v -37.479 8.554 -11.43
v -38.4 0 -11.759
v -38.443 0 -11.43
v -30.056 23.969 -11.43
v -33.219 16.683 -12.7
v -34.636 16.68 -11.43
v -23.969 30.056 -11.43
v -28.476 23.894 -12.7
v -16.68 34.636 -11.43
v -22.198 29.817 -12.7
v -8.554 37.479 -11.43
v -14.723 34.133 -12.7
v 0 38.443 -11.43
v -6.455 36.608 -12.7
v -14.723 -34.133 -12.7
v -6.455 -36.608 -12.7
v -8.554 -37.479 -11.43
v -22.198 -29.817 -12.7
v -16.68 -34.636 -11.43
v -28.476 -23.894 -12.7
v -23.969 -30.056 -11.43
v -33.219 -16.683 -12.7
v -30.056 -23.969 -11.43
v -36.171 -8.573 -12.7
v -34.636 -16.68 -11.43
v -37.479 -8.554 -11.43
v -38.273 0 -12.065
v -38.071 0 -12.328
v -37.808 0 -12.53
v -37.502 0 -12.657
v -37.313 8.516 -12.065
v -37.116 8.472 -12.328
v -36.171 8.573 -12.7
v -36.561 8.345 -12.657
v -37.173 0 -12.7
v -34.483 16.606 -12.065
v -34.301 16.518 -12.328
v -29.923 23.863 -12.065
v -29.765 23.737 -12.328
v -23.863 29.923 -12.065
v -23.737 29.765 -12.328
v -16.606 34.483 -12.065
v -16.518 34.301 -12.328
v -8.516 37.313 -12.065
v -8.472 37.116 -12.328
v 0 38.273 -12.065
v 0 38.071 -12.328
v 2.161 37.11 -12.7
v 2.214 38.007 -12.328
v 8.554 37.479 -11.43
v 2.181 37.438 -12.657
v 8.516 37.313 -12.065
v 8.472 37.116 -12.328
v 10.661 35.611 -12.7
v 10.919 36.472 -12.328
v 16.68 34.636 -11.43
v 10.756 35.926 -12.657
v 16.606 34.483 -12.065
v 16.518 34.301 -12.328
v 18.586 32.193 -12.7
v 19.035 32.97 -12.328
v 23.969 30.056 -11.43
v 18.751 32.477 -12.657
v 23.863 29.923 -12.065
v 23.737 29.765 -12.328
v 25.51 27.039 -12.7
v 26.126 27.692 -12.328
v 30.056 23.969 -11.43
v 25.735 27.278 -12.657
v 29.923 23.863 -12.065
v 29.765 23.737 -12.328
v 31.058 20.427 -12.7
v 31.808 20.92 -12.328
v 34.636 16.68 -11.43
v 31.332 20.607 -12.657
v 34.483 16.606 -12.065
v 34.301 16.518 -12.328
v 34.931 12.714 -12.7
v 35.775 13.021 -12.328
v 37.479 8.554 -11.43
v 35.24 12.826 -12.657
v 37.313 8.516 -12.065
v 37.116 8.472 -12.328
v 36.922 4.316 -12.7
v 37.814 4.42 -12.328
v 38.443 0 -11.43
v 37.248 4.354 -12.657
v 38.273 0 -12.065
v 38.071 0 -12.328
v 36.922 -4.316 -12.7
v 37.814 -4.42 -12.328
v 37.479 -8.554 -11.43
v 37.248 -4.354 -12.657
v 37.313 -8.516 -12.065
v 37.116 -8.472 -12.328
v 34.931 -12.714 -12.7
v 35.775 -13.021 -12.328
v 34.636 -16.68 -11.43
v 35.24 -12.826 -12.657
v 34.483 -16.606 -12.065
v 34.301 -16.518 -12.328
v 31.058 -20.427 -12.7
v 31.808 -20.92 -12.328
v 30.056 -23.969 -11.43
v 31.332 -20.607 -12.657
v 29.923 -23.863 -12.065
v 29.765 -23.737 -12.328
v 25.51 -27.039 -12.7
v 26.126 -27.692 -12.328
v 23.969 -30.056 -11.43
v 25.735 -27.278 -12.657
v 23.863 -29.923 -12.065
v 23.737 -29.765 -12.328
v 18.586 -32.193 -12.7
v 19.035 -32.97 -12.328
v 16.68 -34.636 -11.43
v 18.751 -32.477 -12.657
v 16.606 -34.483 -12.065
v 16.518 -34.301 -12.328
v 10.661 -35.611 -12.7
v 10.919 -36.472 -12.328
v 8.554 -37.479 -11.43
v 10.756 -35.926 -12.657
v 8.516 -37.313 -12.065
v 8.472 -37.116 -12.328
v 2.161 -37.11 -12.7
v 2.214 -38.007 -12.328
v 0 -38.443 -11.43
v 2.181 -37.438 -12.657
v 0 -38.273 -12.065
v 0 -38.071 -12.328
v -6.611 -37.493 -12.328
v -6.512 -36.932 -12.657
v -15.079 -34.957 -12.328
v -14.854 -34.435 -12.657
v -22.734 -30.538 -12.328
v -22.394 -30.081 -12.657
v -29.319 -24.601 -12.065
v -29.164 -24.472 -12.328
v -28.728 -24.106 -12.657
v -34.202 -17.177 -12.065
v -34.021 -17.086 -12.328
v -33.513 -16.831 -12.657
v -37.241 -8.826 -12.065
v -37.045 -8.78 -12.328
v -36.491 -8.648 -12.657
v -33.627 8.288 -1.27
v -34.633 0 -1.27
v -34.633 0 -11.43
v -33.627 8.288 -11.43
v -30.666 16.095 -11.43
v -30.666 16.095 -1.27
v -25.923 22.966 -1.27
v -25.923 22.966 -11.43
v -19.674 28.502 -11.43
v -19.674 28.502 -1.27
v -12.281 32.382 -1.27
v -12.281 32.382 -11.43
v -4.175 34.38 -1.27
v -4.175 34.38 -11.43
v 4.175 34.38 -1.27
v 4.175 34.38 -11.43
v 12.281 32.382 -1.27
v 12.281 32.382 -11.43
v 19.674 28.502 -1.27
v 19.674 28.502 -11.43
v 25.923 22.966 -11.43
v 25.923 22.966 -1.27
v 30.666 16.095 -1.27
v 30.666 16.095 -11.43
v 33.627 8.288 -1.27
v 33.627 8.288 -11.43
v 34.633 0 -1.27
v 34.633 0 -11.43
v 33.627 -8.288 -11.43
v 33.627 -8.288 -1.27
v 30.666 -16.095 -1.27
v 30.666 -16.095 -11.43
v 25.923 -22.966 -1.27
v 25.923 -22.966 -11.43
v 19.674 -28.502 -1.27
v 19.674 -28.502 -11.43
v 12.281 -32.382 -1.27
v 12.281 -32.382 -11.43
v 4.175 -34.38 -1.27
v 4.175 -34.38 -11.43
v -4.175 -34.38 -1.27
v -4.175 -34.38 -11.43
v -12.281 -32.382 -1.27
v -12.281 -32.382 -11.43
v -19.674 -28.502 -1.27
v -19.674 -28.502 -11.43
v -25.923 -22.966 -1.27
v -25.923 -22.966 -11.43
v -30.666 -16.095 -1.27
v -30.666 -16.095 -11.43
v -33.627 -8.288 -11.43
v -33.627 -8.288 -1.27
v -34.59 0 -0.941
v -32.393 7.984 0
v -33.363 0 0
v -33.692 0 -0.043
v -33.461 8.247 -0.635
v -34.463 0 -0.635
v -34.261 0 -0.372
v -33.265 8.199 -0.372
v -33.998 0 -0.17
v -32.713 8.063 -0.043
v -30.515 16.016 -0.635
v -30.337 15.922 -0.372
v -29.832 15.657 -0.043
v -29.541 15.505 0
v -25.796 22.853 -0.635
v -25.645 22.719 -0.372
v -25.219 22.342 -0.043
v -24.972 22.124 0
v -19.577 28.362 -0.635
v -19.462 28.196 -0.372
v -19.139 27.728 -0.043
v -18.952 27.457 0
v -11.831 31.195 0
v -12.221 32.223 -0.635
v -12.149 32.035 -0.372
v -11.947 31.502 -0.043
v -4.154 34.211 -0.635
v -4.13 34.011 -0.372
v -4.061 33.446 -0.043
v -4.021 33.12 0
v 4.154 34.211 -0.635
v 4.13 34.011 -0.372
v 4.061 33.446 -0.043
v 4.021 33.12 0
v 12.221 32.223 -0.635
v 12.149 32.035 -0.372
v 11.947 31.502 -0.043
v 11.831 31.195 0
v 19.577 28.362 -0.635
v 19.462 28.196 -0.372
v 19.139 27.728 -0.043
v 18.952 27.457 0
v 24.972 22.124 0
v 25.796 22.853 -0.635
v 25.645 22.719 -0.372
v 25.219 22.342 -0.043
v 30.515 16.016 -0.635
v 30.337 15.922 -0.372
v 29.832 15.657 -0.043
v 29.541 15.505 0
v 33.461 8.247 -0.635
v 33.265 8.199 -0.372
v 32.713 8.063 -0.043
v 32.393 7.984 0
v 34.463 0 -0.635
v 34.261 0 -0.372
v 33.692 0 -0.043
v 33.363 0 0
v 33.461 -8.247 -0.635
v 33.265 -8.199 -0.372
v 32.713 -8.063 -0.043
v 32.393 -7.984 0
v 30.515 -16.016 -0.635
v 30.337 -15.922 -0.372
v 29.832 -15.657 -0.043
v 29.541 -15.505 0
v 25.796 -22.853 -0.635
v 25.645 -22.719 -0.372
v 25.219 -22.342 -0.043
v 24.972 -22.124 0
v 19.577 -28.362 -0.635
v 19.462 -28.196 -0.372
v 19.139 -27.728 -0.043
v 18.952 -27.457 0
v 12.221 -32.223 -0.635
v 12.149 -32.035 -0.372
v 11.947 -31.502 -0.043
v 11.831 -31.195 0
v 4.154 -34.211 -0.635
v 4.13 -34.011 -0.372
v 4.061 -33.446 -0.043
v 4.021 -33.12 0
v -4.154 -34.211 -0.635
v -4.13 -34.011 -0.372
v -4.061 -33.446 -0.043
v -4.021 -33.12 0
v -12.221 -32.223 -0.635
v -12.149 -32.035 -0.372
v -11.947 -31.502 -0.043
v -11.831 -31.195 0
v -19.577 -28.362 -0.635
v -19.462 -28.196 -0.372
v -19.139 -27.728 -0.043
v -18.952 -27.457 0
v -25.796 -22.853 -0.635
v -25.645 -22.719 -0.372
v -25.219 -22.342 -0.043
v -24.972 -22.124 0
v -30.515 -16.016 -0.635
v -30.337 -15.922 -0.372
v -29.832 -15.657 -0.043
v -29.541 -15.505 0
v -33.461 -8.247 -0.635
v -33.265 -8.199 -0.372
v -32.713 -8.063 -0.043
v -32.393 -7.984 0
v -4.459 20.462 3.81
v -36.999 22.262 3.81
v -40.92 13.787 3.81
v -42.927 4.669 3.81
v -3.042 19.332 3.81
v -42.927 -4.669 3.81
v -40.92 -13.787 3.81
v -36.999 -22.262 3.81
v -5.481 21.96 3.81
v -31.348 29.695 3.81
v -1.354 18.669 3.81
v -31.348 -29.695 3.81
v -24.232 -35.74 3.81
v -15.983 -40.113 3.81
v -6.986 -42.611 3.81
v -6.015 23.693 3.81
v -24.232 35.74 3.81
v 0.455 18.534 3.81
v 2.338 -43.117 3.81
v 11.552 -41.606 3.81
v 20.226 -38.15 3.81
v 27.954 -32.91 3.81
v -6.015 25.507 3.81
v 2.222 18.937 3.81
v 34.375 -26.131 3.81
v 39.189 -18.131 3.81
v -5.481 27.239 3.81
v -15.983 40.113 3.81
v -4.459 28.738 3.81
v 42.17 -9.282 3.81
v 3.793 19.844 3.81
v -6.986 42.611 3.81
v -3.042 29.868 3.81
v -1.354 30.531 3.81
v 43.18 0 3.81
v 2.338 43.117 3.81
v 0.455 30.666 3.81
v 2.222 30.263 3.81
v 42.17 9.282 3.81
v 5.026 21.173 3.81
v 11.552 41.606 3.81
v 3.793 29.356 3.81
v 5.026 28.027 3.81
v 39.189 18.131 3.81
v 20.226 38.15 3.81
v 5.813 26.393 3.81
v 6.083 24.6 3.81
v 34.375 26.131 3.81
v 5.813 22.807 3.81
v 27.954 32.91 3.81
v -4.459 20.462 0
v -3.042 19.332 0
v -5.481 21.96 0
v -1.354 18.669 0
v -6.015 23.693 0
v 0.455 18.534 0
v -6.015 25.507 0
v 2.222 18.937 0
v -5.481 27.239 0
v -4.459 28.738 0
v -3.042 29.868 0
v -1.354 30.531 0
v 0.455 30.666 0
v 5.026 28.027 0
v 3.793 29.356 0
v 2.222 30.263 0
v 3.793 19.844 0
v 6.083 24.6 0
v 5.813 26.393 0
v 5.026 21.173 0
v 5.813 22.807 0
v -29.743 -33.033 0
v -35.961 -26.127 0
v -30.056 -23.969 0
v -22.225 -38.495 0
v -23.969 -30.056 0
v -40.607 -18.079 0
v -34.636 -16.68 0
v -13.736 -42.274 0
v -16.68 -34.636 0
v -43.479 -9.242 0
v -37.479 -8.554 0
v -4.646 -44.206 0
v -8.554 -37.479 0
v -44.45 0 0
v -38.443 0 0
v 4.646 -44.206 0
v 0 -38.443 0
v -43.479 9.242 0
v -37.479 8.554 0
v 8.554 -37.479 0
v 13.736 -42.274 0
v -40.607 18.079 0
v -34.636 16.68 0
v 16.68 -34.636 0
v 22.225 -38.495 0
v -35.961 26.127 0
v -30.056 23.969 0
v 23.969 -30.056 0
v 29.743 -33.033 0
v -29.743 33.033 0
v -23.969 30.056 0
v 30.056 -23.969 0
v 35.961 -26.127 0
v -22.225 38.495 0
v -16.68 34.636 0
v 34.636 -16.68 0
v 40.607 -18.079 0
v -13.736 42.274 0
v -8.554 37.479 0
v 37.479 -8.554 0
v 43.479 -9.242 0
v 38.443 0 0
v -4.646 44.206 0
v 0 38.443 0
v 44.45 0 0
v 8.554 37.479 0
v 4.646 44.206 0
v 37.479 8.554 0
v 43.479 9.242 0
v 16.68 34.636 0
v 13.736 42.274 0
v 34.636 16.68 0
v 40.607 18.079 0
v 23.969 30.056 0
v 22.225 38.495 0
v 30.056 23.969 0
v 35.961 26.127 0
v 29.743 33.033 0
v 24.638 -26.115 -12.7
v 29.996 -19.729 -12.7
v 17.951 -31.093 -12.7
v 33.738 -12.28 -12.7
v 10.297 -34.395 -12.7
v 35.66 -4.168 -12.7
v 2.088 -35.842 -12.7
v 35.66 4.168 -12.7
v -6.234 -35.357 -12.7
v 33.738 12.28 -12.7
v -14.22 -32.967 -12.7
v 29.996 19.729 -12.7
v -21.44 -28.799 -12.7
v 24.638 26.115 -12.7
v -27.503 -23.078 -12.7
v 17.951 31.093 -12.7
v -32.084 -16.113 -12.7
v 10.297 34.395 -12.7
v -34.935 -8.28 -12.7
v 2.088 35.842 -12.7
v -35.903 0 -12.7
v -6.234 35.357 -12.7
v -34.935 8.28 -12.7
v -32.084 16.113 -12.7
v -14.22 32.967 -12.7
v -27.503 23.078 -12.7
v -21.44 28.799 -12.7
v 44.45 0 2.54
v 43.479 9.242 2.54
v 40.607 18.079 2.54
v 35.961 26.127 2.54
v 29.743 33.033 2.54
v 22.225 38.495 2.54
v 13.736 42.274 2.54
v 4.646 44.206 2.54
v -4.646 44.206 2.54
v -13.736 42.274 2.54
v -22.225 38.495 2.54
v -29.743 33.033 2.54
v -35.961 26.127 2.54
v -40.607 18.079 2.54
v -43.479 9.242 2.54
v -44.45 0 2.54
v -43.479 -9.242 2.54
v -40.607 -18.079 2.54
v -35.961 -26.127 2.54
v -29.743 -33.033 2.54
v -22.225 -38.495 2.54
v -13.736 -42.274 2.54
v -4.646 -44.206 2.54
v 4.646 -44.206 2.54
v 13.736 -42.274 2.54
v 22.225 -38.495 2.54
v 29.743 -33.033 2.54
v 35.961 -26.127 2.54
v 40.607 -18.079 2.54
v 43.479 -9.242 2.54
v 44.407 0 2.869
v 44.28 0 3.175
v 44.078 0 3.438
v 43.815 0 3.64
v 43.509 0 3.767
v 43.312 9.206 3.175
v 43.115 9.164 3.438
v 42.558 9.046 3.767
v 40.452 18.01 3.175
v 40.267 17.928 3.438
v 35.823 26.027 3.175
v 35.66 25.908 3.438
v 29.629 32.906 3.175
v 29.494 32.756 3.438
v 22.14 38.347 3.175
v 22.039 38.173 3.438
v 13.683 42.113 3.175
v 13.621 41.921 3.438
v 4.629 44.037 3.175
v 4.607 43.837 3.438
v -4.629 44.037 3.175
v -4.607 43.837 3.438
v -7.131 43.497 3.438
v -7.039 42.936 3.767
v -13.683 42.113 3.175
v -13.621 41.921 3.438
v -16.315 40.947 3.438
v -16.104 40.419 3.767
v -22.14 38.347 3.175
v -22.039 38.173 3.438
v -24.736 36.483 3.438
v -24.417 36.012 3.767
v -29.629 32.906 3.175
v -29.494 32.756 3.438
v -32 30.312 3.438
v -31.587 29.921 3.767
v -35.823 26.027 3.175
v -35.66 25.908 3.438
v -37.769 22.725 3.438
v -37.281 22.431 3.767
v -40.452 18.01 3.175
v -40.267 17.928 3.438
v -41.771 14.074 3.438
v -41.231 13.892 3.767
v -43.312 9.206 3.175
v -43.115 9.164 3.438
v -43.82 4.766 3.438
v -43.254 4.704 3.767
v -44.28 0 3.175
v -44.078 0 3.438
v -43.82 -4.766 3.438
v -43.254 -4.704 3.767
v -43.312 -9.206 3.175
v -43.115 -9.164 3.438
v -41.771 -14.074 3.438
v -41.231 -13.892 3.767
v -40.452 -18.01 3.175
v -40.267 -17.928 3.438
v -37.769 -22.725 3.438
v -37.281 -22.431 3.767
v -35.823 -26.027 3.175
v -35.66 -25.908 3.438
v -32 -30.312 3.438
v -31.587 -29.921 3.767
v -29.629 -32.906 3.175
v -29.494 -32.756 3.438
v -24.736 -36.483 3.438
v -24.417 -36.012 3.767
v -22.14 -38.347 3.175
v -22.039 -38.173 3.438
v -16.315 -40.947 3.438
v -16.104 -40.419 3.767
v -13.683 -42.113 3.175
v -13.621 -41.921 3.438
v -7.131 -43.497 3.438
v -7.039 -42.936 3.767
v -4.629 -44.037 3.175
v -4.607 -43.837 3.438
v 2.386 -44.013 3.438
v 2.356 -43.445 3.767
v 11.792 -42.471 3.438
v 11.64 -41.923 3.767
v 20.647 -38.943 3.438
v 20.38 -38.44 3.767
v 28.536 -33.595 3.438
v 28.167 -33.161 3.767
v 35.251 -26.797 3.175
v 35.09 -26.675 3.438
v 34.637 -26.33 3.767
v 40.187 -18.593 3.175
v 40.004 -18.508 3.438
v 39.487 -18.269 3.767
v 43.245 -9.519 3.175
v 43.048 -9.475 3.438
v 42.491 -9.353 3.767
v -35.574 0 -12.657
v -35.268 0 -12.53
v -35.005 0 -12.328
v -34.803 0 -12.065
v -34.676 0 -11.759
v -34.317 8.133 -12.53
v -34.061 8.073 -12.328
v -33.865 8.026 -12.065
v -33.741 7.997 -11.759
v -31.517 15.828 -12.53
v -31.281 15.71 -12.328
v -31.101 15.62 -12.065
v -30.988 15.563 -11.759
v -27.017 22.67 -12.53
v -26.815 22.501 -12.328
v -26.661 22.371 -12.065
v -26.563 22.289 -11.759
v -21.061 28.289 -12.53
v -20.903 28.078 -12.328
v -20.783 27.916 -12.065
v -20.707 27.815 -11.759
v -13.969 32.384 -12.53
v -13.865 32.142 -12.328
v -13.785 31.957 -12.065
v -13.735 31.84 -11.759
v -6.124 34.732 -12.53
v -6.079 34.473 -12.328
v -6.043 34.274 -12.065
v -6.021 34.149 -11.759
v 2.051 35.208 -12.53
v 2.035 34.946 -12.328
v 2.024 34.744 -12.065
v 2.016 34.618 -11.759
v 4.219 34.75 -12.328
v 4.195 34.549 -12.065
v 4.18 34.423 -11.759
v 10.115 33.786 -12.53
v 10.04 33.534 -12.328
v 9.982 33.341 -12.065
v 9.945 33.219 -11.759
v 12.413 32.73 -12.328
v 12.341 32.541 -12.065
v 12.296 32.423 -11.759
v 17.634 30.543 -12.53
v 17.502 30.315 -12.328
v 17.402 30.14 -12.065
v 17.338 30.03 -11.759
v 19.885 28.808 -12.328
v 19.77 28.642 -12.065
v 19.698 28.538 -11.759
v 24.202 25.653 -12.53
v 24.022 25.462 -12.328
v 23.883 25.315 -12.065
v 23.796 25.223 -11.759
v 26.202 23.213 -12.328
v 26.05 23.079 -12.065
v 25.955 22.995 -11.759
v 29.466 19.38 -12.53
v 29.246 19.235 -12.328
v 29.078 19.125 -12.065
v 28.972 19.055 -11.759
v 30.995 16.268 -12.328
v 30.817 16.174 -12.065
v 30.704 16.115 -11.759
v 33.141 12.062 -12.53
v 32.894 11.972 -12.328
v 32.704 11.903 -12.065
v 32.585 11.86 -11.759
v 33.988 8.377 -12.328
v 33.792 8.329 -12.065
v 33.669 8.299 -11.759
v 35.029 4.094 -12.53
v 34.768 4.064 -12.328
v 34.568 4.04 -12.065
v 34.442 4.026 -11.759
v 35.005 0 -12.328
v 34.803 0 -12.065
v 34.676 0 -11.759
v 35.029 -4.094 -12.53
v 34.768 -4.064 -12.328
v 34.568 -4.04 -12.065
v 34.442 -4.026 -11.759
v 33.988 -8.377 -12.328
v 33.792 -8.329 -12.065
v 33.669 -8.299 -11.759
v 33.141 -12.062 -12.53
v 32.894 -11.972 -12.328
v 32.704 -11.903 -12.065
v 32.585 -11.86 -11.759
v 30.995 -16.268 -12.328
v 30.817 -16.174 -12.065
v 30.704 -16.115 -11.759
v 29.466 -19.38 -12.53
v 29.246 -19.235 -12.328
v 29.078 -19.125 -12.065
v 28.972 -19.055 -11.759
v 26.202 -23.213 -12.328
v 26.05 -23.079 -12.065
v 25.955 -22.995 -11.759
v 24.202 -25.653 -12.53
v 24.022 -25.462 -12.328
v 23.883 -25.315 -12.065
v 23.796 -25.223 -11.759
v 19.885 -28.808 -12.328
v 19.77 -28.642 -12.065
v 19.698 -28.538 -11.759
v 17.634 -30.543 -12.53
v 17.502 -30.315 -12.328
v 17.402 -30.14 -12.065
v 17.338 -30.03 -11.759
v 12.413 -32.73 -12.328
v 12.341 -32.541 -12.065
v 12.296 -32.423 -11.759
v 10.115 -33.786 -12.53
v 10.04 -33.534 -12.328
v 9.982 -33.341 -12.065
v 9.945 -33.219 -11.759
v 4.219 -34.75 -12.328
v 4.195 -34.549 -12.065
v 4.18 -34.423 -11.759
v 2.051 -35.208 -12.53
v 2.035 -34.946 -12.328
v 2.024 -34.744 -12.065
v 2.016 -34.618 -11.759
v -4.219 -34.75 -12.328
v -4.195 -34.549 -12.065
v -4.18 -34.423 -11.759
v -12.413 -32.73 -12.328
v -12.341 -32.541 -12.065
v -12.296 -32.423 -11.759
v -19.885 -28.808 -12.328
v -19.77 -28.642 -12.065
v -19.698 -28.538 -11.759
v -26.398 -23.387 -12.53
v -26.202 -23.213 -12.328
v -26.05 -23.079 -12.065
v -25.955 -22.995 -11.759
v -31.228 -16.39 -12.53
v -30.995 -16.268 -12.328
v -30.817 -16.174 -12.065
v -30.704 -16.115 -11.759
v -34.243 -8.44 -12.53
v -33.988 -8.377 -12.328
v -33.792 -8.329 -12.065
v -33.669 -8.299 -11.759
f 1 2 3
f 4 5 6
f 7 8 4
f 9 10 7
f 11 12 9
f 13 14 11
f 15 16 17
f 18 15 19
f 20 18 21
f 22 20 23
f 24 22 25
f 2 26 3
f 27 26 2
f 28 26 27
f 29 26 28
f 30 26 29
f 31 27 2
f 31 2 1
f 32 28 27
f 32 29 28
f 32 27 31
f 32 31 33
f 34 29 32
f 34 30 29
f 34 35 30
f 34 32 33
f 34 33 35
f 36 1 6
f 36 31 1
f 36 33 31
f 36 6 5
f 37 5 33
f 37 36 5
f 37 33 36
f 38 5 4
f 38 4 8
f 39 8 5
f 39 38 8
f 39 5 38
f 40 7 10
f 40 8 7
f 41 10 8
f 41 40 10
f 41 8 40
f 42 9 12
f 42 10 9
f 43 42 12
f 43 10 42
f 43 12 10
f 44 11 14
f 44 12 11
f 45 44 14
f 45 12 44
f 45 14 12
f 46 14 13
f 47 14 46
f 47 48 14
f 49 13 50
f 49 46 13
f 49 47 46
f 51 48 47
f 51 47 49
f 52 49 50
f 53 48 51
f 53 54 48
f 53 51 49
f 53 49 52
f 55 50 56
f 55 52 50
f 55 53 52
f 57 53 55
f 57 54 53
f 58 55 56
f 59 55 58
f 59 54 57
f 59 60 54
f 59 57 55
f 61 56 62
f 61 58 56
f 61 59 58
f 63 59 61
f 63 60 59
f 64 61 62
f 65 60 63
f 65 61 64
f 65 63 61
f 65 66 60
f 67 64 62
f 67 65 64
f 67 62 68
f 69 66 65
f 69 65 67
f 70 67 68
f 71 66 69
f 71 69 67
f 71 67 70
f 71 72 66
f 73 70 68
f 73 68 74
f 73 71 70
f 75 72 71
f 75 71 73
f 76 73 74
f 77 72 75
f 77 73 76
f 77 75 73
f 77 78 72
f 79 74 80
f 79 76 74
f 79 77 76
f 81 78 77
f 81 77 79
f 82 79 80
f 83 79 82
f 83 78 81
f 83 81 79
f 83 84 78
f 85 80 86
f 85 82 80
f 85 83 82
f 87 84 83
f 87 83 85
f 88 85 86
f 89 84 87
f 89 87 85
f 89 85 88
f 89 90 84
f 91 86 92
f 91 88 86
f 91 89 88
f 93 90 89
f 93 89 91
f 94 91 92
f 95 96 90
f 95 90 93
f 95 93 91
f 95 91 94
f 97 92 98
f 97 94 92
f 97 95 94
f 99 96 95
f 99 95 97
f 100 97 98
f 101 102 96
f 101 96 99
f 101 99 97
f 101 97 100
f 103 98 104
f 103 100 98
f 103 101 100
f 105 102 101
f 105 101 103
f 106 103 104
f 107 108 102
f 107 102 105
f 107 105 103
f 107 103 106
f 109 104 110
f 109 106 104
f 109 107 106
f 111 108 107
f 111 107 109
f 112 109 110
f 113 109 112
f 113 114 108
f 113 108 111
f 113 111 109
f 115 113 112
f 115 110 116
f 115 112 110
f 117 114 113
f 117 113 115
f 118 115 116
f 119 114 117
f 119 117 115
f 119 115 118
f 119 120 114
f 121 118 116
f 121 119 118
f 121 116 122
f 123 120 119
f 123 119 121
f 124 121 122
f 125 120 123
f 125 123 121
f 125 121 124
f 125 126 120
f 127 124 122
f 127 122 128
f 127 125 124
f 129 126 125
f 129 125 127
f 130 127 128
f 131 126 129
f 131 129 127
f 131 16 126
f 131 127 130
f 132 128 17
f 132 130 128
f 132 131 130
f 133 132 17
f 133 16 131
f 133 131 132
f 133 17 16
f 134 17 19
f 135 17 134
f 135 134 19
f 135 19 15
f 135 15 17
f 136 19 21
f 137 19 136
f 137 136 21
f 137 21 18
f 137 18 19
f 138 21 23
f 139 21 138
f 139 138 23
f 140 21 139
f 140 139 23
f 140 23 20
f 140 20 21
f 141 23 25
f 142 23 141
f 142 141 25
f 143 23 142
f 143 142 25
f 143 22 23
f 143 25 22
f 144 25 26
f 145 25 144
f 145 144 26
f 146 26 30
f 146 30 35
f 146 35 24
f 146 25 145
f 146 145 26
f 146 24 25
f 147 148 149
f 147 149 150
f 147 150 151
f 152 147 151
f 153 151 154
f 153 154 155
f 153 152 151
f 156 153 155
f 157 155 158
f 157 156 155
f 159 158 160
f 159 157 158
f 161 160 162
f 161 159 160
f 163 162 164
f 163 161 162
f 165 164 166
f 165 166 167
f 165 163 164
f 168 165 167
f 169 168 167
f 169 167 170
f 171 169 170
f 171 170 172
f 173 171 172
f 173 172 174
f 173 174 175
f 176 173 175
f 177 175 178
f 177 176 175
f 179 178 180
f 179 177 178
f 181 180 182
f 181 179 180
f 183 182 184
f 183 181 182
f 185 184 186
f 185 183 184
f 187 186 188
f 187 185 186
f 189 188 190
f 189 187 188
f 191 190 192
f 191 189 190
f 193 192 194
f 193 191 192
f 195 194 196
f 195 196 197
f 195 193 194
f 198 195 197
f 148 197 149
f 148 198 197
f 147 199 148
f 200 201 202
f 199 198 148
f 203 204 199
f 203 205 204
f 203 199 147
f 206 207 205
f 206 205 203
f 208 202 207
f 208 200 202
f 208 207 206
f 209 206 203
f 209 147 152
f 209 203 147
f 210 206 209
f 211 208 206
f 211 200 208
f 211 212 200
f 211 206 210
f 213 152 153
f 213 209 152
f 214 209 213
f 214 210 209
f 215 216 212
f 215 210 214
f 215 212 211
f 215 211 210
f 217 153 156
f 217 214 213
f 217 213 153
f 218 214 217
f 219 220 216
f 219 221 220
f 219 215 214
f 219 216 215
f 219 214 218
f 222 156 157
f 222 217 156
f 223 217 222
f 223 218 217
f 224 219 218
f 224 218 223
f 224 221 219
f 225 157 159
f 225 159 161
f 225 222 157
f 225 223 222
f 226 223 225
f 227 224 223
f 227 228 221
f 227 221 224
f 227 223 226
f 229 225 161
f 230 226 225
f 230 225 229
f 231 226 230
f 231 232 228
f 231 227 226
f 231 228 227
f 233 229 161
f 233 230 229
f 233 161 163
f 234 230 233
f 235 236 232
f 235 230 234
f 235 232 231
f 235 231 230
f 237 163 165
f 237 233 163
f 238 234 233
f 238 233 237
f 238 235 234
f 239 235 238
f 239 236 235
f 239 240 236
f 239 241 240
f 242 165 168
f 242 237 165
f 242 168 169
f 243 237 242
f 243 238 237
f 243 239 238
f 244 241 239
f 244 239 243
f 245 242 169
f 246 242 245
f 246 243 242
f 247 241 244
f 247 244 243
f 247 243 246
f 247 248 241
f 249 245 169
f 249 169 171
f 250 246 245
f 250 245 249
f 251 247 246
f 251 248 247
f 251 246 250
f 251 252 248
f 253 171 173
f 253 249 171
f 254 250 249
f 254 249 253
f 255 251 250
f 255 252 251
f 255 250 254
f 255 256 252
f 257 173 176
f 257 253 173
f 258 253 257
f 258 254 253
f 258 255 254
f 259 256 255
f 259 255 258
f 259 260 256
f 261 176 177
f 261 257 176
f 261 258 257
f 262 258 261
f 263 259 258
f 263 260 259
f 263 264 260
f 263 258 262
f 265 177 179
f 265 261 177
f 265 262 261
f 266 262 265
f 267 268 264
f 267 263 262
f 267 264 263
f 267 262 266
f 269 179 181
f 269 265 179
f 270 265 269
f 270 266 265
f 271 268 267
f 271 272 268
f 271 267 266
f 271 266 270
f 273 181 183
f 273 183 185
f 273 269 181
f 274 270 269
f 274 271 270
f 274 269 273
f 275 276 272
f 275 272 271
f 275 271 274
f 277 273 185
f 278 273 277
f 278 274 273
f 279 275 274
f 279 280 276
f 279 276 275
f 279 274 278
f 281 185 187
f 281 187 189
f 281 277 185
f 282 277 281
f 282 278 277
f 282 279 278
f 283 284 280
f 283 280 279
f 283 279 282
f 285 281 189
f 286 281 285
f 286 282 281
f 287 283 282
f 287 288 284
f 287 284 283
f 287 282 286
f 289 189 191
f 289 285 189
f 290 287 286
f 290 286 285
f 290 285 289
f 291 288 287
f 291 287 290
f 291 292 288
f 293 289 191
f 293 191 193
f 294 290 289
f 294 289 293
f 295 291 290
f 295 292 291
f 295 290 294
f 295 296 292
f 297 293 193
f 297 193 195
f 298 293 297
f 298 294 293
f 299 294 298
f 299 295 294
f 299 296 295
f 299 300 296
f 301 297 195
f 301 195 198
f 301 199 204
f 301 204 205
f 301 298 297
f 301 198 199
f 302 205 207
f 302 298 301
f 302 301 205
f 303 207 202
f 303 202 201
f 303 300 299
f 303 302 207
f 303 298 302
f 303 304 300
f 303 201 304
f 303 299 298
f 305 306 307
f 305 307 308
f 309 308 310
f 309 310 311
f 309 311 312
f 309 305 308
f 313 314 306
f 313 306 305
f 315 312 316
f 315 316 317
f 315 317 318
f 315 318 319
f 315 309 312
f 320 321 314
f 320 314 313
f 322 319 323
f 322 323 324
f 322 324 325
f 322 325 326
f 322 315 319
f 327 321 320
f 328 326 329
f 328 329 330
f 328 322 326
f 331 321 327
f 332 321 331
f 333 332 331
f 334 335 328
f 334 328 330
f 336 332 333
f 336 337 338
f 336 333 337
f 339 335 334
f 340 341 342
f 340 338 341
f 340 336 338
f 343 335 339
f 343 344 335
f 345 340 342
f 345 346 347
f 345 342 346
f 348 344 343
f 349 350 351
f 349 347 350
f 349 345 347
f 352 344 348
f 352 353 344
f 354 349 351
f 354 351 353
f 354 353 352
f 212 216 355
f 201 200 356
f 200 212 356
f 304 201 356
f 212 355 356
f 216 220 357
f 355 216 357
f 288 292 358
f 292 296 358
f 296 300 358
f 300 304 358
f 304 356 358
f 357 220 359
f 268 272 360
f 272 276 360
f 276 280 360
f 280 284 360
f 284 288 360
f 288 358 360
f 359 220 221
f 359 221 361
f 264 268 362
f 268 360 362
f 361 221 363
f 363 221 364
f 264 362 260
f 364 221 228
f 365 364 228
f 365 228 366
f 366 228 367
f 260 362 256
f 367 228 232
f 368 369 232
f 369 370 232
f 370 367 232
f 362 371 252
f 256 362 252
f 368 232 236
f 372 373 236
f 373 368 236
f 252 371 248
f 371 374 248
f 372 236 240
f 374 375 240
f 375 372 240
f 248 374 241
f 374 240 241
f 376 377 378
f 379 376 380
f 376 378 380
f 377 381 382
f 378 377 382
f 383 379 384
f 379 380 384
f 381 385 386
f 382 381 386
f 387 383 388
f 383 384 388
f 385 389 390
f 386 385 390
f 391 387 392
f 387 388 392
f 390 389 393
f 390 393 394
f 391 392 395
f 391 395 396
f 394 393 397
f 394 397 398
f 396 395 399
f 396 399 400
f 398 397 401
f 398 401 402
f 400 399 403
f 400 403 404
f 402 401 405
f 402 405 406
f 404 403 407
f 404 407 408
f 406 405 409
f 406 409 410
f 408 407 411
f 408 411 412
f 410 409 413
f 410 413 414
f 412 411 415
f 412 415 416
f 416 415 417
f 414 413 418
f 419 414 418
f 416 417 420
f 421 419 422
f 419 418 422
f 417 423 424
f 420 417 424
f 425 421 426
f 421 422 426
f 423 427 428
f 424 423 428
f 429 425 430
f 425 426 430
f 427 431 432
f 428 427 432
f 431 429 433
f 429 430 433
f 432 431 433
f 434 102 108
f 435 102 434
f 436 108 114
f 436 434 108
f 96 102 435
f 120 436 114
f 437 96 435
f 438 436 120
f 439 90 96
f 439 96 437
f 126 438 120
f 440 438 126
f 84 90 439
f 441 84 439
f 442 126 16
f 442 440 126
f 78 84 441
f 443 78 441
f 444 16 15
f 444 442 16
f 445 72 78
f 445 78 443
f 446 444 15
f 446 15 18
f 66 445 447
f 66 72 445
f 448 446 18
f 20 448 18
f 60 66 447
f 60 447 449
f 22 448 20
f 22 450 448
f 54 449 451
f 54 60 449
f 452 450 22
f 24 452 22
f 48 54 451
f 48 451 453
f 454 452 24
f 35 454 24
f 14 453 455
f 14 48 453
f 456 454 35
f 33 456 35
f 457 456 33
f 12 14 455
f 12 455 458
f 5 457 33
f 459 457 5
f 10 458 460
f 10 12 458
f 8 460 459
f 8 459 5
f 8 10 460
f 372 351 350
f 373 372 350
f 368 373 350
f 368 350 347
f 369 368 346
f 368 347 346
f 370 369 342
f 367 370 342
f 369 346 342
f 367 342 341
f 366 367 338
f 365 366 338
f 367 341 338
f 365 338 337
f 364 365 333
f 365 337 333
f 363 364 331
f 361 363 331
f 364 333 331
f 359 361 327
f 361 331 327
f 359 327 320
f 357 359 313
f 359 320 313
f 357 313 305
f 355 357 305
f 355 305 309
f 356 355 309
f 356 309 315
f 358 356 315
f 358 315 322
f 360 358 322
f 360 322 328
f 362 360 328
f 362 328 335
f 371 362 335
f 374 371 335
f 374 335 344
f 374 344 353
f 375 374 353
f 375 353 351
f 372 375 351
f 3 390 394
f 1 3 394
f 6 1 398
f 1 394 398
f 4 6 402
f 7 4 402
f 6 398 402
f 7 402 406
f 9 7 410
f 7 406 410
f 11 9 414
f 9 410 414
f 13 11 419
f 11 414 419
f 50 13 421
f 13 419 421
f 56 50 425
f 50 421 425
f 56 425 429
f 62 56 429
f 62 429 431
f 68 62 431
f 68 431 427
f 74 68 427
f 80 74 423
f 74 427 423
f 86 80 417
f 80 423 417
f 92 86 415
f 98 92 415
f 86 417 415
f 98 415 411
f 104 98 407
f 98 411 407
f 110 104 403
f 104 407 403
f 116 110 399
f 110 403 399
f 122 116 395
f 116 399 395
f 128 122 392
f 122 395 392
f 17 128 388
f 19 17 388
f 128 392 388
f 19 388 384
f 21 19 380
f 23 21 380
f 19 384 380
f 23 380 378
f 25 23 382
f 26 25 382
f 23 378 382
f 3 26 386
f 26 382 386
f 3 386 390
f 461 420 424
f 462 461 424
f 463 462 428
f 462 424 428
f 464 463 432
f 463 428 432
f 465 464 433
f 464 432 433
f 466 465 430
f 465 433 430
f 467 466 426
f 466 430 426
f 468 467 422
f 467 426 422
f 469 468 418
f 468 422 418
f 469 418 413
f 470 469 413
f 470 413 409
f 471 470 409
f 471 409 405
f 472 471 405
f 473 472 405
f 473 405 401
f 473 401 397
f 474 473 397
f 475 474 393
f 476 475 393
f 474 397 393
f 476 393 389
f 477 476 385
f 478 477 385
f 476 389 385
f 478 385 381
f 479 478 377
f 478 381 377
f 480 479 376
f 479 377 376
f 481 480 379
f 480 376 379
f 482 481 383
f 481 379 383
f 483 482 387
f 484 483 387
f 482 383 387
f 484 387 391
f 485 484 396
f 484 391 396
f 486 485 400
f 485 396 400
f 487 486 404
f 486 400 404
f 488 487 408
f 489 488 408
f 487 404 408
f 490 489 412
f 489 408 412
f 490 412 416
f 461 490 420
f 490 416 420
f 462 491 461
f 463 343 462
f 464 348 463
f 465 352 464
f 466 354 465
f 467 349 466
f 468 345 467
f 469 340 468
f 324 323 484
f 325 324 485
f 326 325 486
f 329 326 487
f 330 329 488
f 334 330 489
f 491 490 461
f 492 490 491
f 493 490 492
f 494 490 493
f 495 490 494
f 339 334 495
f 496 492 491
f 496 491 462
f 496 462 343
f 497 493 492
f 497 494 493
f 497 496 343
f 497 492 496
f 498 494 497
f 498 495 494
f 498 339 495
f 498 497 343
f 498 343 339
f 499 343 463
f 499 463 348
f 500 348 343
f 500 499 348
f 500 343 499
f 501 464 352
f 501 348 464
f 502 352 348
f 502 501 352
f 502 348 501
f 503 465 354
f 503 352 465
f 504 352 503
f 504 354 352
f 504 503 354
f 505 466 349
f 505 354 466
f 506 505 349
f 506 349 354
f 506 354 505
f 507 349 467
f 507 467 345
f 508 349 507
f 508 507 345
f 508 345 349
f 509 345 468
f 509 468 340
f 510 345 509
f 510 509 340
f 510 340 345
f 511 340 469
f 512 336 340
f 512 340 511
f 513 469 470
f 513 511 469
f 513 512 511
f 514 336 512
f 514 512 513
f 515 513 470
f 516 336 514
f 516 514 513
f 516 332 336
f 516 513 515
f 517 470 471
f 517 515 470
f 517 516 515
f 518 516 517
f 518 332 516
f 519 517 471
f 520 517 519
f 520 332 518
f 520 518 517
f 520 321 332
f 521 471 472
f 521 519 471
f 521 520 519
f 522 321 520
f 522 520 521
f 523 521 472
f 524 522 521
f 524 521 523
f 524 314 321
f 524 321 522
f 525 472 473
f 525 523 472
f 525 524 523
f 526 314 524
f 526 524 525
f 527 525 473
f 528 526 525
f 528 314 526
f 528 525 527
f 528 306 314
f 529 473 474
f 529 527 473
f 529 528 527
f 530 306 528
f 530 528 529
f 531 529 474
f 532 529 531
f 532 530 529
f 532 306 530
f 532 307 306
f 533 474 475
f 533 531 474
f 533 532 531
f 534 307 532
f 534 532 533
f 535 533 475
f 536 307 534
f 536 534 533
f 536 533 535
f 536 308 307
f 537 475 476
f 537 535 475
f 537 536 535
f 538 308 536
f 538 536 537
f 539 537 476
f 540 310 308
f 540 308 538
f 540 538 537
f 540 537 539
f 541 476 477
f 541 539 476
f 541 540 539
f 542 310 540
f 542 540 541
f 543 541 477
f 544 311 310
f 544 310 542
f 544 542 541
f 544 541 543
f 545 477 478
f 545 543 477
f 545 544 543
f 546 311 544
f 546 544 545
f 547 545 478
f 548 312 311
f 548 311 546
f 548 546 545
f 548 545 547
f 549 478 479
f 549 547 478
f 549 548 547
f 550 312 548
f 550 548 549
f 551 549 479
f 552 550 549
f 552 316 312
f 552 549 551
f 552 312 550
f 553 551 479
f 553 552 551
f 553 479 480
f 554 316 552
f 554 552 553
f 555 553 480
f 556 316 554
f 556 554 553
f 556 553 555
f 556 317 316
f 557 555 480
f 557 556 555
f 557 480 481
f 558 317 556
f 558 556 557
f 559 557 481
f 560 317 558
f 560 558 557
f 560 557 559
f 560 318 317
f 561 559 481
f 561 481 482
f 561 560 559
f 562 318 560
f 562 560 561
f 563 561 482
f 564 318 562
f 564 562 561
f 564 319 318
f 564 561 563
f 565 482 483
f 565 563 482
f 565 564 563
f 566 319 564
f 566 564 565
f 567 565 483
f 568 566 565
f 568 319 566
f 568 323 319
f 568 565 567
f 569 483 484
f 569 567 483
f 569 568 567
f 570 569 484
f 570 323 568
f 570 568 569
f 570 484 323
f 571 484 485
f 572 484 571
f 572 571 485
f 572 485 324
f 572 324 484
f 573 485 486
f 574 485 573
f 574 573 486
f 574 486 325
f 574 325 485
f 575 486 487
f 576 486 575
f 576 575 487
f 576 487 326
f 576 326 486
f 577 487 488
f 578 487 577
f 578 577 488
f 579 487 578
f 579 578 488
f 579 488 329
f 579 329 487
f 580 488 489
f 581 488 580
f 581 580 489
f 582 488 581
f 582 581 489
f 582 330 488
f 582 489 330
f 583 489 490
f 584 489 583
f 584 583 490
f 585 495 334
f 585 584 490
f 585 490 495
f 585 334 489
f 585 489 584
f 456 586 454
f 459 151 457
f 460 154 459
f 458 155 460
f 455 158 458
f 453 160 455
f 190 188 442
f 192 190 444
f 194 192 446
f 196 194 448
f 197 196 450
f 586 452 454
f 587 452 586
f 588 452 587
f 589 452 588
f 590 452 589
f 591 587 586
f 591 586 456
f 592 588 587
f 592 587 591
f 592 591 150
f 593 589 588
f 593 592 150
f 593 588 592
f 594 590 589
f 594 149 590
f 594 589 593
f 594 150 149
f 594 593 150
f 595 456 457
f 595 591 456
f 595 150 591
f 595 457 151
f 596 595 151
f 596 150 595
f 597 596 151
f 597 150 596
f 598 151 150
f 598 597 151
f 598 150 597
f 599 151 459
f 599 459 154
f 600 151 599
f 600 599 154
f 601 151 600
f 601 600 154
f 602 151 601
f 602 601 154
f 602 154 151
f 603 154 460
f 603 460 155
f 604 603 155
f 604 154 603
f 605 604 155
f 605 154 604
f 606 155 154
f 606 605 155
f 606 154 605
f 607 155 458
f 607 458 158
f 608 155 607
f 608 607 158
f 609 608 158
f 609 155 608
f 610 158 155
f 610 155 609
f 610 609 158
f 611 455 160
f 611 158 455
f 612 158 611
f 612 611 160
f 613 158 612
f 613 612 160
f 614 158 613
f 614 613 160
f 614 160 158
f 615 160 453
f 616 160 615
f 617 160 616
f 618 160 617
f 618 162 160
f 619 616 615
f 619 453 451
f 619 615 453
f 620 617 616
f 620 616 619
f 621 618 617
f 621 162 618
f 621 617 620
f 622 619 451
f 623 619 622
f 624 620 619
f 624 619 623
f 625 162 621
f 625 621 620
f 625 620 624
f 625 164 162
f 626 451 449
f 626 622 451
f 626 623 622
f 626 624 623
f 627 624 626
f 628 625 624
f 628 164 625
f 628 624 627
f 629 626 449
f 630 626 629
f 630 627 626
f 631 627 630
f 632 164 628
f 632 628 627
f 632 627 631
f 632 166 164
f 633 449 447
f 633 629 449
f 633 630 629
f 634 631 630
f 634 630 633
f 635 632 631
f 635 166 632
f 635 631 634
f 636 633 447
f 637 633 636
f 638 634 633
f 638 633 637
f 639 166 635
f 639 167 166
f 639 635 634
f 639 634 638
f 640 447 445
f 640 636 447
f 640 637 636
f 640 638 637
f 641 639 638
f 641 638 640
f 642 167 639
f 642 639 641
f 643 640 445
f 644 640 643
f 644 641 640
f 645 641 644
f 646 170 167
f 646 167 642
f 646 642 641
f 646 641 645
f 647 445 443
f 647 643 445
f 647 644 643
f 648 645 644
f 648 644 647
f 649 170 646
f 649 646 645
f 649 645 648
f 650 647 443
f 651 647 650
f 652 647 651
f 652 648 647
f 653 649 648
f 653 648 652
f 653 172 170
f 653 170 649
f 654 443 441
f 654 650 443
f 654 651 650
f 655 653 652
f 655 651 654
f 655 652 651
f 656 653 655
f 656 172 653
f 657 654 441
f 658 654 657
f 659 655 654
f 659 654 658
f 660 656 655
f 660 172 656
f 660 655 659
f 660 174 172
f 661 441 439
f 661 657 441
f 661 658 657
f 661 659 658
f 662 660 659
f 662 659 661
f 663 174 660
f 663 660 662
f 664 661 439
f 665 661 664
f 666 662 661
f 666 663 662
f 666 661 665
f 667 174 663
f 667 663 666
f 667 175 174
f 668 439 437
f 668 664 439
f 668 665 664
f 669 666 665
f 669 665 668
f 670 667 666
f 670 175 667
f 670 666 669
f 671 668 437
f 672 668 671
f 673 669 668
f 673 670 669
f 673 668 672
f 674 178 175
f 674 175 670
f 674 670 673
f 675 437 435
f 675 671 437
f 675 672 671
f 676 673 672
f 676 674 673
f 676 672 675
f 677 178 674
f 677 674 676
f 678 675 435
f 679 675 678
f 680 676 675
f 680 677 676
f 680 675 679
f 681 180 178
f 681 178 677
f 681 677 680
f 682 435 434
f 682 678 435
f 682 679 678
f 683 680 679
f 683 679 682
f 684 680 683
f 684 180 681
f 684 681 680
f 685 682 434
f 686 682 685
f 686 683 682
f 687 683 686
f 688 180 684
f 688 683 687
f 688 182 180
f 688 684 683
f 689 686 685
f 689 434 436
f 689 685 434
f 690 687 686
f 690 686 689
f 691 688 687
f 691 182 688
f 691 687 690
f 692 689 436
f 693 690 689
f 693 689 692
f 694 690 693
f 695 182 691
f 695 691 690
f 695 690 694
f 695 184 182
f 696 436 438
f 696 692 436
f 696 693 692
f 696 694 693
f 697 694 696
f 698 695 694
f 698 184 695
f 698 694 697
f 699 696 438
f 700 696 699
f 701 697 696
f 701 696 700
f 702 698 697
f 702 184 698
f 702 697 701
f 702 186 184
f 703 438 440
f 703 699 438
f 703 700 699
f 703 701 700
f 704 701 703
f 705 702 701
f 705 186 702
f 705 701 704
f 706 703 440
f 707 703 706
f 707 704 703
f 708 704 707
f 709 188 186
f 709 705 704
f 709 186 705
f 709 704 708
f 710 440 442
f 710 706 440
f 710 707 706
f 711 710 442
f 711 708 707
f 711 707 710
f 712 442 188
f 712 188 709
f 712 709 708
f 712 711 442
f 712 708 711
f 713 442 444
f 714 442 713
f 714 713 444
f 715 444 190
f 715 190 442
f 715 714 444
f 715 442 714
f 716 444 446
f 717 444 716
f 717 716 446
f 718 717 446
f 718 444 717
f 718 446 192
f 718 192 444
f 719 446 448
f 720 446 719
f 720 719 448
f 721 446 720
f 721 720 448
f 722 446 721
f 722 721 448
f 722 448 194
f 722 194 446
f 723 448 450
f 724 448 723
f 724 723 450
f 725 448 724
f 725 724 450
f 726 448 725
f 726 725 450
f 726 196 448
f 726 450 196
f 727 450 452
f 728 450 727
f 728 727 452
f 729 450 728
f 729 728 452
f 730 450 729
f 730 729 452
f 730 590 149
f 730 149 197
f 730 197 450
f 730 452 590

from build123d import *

# Parameters (mm, degrees)
SKETCH1_R           = 44.45
BOSS_EXTRUDE1_DEPTH = 3.81
SKETCH2_R           = 38.4429
SKETCH2_R_2         = 34.6329
BOSS_EXTRUDE2_DEPTH = 12.7
FILLET1_R           = 1.27
SKETCH4_R           = 6.0833
CUT_EXTRUDE1_DEPTH  = 17.51


with BuildPart() as part:
    # Sketch1 → Boss-Extrude1 (new body)
    with BuildSketch(Plane.XY):
        Circle(SKETCH1_R)
    extrude(amount=BOSS_EXTRUDE1_DEPTH)

    # Sketch2 → Boss-Extrude2 (add)
    with BuildSketch(Plane(origin=(0, 0, 0), x_dir=(-1, 0, 0), z_dir=(0, 0, -1))):
        Circle(SKETCH2_R)
        Circle(SKETCH2_R_2, mode=Mode.SUBTRACT)
    extrude(amount=BOSS_EXTRUDE2_DEPTH)

    # Fillet1
    fillet1_edges = [part.edges().sort_by_distance(p)[0] for p in [
        (-44.45, 0, 3.81),
        (38.4429, 0, -12.7),
        (34.6329, 0, 0),
        (34.6329, 0, -12.7),
    ]]
    fillet(fillet1_edges, radius=FILLET1_R)

    # Sketch4 → Cut-Extrude1 (cut, through all)
    with BuildSketch(Plane.XY.offset(3.81)):
        with Locations((0, 24.5999)):
            Circle(SKETCH4_R)
    extrude(amount=-CUT_EXTRUDE1_DEPTH, mode=Mode.SUBTRACT)


solid = part.part
